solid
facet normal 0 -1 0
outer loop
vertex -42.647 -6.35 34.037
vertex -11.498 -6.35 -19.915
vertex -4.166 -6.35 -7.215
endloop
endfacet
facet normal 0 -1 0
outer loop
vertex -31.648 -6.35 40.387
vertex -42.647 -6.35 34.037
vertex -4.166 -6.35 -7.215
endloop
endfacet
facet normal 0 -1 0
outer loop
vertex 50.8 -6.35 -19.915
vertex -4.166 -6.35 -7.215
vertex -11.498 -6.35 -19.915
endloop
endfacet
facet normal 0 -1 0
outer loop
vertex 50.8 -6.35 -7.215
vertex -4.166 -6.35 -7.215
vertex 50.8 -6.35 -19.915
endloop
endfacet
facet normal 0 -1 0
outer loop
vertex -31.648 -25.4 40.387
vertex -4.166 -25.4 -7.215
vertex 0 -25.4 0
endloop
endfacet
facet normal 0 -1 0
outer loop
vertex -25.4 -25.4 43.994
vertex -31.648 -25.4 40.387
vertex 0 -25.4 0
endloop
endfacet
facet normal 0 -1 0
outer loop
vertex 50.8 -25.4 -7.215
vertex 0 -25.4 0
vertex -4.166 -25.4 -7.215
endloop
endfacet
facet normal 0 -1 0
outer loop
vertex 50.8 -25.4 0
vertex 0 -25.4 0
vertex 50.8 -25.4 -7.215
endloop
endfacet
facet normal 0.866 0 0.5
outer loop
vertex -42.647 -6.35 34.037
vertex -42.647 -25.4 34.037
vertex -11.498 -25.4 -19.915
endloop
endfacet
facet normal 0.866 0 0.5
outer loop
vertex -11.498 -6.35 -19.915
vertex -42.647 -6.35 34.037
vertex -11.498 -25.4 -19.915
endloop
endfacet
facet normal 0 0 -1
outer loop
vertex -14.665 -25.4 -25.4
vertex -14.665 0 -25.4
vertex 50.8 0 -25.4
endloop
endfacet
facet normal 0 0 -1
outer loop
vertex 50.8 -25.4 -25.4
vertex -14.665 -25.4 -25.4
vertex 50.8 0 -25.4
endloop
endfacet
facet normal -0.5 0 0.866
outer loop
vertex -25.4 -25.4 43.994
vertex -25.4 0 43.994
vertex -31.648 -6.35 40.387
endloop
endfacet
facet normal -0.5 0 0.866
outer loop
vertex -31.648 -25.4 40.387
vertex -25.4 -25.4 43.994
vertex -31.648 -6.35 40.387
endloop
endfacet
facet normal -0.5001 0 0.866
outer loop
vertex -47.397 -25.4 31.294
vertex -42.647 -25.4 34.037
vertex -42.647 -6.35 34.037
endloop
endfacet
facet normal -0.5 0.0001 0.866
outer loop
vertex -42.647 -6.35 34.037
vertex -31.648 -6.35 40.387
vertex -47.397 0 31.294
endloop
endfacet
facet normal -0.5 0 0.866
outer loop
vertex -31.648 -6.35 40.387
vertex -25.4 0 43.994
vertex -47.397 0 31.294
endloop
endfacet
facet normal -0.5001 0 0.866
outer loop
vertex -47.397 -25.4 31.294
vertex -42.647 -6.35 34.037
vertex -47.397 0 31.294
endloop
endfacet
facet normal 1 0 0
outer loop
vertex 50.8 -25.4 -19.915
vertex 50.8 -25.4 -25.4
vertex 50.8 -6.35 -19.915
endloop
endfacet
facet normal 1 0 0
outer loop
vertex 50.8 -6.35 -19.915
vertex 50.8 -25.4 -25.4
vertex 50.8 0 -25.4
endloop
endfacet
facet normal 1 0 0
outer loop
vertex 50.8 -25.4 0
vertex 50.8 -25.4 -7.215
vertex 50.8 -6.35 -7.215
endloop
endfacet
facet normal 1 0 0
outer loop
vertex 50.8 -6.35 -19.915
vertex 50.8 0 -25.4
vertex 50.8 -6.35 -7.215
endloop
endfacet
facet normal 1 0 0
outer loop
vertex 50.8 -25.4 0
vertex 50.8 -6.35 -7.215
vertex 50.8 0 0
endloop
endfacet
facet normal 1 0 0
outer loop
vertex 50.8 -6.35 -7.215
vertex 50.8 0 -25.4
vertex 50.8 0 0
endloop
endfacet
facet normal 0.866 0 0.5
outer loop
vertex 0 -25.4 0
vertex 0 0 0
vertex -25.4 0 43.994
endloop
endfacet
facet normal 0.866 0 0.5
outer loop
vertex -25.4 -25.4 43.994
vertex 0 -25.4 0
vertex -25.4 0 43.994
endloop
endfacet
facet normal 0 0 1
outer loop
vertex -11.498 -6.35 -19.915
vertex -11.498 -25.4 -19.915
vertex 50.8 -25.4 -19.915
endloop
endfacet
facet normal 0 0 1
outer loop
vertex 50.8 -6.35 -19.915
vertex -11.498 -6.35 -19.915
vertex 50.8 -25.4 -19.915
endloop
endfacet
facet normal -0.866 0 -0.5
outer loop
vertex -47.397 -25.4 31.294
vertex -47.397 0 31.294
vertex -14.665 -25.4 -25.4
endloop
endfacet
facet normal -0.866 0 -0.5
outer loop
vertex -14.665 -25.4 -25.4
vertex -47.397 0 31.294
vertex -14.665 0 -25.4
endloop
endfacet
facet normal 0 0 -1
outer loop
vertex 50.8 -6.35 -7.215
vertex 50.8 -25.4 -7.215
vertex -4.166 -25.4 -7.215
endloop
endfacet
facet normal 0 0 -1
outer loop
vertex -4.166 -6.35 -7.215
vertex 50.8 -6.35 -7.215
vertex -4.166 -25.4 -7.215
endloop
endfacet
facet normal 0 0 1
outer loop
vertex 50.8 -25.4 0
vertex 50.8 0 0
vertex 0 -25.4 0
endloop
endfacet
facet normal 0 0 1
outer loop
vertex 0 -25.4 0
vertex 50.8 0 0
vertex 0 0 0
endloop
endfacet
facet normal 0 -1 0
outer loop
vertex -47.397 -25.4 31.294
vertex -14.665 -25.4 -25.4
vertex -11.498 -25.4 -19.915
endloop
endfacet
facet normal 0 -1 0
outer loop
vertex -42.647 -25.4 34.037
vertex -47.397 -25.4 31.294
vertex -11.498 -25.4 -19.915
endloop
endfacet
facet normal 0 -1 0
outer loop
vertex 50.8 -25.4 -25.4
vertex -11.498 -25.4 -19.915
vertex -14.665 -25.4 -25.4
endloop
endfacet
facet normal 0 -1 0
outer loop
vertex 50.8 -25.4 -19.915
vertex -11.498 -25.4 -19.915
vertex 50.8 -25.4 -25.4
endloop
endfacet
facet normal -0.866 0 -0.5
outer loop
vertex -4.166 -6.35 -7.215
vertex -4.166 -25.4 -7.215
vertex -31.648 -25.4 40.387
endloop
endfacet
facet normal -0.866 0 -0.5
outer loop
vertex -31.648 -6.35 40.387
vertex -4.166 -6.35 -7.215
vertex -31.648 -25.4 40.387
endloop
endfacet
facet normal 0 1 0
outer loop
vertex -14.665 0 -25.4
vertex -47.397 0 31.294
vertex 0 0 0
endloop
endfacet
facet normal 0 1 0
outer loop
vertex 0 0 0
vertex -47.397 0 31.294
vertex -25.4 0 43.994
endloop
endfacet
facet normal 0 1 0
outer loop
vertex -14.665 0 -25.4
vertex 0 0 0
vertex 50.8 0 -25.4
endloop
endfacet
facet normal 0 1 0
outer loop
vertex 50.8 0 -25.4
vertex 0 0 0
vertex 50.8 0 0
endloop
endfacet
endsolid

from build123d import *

# Parameters (mm, degrees)
F1_DEPTH = 25.4
F3_DEPTH = 19.05


with BuildPart() as f1:
    # F0 (on Front) → F1 (new body)
    with BuildSketch(Plane.XZ):
        Polygon((-25.4, 43.994091), (-47.397045, 31.294091), (-14.664697, -25.4), (50.8, -25.4), (50.8, 0), (0, 0), align=None)
    extrude(amount=F1_DEPTH)

    # F2 (on face) → F3 (cut)
    with BuildSketch(Plane.XZ.offset(25.4)):
        Polygon((-31.648493, 40.386522), (-42.647015, 34.036522), (-11.49801, -19.915138), (50.8, -19.915138), (50.8, -7.215138), (-4.165662, -7.215138), align=None)
    extrude(amount=-F3_DEPTH, mode=Mode.SUBTRACT)


solid = f1.part
